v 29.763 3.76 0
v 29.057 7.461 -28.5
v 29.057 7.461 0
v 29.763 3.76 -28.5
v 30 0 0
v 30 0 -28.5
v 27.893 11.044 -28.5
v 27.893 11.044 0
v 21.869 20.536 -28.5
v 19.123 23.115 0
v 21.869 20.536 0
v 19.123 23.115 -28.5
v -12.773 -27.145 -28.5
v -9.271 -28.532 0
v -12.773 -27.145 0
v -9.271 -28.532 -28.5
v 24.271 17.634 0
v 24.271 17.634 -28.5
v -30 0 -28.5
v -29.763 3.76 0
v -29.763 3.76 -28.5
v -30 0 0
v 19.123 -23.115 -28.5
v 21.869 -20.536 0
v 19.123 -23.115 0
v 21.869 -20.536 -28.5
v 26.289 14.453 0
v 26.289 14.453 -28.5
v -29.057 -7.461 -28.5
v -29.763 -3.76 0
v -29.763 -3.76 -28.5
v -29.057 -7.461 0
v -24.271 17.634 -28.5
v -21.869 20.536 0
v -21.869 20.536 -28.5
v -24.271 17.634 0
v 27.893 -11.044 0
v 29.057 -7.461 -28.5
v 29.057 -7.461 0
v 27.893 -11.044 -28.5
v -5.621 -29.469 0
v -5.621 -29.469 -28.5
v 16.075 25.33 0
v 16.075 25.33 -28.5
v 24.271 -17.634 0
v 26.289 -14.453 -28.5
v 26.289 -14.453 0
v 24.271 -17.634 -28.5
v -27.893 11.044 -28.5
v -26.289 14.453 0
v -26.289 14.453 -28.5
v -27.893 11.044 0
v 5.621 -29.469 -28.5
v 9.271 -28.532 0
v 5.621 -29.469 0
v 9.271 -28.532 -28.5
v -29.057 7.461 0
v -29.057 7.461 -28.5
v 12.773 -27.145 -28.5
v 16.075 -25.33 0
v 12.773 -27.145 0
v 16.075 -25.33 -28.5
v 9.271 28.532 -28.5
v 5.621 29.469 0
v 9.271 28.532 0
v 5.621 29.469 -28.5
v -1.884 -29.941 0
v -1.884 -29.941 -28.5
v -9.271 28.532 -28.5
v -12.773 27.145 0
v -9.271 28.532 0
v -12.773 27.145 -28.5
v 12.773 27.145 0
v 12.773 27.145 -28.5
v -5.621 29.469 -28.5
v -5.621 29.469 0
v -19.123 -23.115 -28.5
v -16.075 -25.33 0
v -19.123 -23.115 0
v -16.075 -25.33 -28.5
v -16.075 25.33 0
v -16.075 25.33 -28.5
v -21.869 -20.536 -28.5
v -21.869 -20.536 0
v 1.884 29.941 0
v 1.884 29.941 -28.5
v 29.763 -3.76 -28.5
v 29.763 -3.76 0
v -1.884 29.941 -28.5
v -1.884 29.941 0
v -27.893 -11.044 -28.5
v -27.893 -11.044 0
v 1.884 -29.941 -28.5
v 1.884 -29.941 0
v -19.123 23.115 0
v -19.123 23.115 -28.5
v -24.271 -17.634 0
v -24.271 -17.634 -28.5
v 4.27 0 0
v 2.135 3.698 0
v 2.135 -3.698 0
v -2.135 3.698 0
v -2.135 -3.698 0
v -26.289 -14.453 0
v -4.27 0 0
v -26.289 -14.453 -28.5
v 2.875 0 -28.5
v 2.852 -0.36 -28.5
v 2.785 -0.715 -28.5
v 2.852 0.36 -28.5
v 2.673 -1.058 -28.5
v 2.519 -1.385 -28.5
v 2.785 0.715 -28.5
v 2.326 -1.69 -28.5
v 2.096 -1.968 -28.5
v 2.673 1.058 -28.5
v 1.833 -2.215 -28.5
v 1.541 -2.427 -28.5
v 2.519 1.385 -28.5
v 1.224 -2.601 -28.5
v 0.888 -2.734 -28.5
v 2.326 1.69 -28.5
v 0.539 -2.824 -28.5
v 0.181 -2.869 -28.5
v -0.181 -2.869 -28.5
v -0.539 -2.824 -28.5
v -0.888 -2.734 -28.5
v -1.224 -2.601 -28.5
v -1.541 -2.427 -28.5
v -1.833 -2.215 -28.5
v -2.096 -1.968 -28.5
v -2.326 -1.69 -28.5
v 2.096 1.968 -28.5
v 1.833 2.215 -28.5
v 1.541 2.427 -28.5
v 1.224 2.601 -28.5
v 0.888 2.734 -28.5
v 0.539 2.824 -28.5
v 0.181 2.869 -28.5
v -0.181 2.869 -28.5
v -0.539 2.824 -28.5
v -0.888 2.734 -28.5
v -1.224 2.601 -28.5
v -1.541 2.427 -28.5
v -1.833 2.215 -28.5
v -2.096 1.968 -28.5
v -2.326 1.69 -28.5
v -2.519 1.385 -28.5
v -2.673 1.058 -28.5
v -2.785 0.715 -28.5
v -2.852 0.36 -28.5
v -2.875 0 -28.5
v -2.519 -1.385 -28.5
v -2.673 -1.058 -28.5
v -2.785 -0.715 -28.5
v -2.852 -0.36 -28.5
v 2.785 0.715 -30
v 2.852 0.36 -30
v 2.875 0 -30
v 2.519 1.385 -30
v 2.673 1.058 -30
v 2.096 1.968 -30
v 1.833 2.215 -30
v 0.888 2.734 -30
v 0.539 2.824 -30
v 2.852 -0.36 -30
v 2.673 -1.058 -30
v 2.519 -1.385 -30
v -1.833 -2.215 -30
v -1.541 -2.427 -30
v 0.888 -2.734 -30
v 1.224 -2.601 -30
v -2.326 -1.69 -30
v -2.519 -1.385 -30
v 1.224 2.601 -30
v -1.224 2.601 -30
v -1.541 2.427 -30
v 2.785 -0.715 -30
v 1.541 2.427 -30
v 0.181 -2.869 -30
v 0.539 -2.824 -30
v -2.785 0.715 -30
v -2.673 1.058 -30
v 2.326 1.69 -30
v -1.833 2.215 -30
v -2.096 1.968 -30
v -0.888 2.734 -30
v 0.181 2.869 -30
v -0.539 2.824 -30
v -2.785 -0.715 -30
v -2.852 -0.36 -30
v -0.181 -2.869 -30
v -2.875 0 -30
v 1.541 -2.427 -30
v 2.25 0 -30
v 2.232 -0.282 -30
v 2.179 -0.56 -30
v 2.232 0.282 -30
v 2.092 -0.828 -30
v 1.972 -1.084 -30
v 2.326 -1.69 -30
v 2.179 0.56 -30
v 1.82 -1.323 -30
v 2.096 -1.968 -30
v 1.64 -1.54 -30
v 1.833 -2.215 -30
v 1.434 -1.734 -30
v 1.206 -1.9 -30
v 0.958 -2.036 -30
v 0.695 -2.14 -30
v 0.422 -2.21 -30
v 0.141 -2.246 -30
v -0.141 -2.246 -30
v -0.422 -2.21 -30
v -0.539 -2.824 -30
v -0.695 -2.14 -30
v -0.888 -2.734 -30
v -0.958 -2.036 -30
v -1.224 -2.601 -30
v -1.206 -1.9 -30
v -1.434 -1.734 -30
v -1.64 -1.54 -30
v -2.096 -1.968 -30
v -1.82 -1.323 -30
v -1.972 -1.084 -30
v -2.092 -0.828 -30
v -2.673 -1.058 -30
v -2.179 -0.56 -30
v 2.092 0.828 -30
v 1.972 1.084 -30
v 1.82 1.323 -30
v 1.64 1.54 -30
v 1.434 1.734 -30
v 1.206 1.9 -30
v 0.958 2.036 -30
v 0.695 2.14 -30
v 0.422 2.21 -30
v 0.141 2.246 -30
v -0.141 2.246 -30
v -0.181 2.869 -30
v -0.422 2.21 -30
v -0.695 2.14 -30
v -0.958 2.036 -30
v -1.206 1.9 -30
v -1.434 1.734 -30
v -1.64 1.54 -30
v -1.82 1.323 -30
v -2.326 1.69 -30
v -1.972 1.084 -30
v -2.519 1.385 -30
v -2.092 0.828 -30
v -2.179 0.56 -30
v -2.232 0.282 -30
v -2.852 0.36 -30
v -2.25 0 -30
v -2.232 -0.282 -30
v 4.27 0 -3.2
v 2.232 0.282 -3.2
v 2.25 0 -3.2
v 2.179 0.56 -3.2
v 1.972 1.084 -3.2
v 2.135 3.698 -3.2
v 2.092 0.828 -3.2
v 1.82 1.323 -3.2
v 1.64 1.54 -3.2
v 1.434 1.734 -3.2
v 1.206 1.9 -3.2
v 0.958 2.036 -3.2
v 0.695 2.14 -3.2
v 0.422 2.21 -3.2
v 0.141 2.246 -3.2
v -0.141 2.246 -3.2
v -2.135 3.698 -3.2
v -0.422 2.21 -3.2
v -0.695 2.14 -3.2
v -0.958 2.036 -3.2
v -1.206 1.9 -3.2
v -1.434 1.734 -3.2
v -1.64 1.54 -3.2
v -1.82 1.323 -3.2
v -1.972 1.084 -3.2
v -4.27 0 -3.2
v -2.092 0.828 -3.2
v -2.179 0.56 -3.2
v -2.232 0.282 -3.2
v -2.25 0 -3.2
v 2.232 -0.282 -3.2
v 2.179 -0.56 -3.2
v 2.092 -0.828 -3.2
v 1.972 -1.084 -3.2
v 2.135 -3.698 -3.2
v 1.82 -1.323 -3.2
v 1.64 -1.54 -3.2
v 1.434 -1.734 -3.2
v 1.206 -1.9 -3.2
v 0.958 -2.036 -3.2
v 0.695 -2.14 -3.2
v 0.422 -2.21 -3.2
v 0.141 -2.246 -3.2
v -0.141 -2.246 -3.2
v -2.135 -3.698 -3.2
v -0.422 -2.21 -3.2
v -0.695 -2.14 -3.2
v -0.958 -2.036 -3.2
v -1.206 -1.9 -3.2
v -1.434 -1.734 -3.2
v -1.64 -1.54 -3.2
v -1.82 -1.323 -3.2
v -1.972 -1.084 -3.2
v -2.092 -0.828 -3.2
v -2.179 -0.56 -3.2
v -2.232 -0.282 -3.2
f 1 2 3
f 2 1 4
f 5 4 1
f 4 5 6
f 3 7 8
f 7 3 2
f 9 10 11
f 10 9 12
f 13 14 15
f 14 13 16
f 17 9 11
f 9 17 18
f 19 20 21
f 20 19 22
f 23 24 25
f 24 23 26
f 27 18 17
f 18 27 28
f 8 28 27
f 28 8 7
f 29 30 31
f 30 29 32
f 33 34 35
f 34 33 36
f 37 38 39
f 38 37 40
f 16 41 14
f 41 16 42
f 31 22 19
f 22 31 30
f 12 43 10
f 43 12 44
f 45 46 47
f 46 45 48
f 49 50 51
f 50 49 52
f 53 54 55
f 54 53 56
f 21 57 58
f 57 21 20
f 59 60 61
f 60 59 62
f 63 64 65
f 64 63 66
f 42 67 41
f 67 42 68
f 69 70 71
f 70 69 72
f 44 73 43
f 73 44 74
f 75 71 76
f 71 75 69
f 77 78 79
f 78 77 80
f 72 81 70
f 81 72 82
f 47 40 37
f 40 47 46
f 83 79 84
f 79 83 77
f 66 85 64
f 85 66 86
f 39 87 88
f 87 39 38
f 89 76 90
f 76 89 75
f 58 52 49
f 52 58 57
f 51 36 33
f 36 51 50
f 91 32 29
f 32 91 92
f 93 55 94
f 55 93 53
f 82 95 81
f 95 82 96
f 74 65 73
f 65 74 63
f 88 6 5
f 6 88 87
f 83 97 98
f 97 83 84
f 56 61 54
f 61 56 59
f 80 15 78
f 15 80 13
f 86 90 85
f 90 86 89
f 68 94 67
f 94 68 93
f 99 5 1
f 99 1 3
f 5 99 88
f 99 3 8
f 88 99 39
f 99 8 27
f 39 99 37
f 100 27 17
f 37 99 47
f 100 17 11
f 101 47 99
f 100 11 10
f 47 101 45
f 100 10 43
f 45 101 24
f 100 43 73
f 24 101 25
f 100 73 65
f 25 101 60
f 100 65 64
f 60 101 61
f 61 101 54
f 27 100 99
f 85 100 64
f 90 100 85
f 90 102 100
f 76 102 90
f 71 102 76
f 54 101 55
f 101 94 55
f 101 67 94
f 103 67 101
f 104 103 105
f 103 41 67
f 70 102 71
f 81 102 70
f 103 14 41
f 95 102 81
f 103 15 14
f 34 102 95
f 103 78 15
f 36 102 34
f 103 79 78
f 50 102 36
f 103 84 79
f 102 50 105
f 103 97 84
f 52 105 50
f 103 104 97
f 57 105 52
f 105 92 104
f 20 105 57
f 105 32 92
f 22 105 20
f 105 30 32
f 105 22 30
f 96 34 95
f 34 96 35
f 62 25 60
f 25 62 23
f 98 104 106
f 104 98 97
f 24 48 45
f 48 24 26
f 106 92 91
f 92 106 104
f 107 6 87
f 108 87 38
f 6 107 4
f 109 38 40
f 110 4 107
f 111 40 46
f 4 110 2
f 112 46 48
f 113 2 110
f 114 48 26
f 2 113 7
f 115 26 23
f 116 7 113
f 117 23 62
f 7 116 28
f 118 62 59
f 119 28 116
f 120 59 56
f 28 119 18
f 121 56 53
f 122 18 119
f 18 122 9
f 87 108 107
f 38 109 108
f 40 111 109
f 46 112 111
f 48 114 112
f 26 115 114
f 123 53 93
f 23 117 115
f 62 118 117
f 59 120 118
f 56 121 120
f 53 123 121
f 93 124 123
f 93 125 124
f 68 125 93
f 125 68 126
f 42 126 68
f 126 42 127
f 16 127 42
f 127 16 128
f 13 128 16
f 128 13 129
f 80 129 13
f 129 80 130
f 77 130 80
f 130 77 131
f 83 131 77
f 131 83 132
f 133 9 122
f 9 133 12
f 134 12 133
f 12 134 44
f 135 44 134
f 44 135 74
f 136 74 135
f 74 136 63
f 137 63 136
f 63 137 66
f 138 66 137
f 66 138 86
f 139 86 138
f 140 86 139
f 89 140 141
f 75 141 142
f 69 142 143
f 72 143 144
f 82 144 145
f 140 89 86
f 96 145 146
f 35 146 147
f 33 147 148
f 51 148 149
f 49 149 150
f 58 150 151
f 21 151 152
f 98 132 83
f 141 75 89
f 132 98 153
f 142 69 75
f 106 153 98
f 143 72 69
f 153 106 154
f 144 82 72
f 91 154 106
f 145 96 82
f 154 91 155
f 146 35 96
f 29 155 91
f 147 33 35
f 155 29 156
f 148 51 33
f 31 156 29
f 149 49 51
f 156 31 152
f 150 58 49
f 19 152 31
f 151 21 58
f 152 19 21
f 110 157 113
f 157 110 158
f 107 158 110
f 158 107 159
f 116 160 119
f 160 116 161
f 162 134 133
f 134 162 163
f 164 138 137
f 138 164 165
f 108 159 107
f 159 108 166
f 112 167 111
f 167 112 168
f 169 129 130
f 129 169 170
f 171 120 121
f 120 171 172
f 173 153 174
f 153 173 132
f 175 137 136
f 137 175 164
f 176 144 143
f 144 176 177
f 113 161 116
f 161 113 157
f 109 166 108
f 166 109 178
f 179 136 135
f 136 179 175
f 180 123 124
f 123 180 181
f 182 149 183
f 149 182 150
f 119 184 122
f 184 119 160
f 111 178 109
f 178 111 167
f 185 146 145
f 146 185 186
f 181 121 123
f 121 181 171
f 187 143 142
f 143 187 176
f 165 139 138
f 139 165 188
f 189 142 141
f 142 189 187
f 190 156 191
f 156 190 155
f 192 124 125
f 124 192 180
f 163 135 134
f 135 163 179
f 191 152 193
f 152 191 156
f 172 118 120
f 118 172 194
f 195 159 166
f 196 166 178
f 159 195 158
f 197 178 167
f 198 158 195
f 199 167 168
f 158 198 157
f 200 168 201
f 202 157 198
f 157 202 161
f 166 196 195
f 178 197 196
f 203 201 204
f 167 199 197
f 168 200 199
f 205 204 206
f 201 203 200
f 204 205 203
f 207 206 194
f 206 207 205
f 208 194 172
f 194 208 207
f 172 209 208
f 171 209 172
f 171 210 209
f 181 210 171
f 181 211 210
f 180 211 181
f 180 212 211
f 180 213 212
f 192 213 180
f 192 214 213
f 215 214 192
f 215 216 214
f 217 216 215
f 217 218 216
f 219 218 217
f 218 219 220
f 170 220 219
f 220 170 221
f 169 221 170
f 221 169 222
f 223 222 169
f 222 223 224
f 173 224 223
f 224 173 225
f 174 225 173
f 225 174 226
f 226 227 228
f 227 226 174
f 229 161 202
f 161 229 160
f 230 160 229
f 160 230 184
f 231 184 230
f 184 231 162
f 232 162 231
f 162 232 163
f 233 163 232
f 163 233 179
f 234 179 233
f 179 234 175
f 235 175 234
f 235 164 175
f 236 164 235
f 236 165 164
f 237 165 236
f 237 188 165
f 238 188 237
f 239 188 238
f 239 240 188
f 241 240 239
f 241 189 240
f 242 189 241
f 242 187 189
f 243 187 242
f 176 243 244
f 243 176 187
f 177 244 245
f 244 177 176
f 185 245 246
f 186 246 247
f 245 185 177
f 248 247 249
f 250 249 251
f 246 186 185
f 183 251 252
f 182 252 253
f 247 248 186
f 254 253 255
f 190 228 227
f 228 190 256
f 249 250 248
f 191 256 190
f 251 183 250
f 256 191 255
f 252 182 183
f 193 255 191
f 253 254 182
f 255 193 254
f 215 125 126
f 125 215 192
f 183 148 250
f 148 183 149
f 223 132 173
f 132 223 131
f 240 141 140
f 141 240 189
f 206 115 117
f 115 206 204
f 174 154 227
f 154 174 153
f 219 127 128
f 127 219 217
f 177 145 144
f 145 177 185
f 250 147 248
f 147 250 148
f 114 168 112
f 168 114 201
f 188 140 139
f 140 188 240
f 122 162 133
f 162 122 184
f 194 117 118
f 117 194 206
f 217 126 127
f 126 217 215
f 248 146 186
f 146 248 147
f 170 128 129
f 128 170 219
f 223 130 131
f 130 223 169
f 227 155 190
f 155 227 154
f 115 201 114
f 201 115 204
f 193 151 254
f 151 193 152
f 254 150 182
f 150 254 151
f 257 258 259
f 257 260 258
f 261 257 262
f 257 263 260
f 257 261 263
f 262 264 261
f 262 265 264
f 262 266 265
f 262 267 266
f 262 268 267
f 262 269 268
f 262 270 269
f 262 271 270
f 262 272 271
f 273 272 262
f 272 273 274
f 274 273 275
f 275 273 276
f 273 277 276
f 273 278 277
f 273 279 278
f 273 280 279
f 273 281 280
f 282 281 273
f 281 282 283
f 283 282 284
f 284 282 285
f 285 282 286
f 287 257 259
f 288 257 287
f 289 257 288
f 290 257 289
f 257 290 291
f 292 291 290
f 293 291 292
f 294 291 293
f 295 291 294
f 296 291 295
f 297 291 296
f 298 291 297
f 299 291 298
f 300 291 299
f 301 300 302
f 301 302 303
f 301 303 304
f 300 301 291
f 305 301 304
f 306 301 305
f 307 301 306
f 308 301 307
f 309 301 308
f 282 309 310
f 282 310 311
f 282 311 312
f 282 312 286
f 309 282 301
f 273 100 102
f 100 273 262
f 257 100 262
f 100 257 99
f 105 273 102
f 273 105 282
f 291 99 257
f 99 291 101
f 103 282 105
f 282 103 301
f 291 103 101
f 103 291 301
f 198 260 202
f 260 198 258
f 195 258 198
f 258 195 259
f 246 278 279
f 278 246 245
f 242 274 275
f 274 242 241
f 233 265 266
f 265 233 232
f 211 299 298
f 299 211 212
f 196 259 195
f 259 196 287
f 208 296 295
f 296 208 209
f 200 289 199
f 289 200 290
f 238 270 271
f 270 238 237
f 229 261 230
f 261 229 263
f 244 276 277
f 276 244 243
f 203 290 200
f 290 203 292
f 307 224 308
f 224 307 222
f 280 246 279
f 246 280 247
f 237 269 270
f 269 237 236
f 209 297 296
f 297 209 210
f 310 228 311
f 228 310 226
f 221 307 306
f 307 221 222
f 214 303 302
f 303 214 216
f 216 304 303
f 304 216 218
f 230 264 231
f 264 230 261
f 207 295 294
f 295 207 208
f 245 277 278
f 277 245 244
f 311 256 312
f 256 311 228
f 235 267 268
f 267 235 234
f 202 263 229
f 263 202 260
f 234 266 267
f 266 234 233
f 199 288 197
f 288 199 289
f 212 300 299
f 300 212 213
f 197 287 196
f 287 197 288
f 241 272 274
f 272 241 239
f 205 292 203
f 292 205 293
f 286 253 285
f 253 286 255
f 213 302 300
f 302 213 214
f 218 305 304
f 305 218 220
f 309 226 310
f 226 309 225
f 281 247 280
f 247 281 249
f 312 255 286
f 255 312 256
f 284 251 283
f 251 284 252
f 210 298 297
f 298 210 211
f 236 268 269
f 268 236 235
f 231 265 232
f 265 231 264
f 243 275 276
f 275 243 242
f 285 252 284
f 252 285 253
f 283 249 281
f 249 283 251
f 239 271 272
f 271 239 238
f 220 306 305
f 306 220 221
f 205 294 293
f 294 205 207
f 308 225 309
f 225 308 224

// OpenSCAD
$fn = 50;

difference() {
	union() {
		translate(v = [0, 0, -28.5]) {
			cylinder(h = 28.5, r = 30.0);
		}
		#translate(v = [0, 0, -30.0]) {
			cylinder(h = 30, r = 2.875);
		}
	}
	union() {
		translate(v = [0, 0, 0]) {
			rotate(a = [0, 0, 0]) {
				difference() {
					union() {
						translate(v = [0, 0, -3.2]) {
							linear_extrude(height = 3.2) {
								polygon(points = [[4.2698, 0.0], [2.1349000000000005, 3.697755269078796], [-2.134899999999999, 3.6977552690787965], [-4.2698, 5.228996902999369e-16], [-2.134900000000002, -3.6977552690787956], [2.1348999999999974, -3.697755269078798]]);
							}
						}
					}
					union();
				}
			}
		}
		#translate(v = [0, 0, -100.0]) {
			cylinder(h = 200, r = 2.25);
		}
	}
}
